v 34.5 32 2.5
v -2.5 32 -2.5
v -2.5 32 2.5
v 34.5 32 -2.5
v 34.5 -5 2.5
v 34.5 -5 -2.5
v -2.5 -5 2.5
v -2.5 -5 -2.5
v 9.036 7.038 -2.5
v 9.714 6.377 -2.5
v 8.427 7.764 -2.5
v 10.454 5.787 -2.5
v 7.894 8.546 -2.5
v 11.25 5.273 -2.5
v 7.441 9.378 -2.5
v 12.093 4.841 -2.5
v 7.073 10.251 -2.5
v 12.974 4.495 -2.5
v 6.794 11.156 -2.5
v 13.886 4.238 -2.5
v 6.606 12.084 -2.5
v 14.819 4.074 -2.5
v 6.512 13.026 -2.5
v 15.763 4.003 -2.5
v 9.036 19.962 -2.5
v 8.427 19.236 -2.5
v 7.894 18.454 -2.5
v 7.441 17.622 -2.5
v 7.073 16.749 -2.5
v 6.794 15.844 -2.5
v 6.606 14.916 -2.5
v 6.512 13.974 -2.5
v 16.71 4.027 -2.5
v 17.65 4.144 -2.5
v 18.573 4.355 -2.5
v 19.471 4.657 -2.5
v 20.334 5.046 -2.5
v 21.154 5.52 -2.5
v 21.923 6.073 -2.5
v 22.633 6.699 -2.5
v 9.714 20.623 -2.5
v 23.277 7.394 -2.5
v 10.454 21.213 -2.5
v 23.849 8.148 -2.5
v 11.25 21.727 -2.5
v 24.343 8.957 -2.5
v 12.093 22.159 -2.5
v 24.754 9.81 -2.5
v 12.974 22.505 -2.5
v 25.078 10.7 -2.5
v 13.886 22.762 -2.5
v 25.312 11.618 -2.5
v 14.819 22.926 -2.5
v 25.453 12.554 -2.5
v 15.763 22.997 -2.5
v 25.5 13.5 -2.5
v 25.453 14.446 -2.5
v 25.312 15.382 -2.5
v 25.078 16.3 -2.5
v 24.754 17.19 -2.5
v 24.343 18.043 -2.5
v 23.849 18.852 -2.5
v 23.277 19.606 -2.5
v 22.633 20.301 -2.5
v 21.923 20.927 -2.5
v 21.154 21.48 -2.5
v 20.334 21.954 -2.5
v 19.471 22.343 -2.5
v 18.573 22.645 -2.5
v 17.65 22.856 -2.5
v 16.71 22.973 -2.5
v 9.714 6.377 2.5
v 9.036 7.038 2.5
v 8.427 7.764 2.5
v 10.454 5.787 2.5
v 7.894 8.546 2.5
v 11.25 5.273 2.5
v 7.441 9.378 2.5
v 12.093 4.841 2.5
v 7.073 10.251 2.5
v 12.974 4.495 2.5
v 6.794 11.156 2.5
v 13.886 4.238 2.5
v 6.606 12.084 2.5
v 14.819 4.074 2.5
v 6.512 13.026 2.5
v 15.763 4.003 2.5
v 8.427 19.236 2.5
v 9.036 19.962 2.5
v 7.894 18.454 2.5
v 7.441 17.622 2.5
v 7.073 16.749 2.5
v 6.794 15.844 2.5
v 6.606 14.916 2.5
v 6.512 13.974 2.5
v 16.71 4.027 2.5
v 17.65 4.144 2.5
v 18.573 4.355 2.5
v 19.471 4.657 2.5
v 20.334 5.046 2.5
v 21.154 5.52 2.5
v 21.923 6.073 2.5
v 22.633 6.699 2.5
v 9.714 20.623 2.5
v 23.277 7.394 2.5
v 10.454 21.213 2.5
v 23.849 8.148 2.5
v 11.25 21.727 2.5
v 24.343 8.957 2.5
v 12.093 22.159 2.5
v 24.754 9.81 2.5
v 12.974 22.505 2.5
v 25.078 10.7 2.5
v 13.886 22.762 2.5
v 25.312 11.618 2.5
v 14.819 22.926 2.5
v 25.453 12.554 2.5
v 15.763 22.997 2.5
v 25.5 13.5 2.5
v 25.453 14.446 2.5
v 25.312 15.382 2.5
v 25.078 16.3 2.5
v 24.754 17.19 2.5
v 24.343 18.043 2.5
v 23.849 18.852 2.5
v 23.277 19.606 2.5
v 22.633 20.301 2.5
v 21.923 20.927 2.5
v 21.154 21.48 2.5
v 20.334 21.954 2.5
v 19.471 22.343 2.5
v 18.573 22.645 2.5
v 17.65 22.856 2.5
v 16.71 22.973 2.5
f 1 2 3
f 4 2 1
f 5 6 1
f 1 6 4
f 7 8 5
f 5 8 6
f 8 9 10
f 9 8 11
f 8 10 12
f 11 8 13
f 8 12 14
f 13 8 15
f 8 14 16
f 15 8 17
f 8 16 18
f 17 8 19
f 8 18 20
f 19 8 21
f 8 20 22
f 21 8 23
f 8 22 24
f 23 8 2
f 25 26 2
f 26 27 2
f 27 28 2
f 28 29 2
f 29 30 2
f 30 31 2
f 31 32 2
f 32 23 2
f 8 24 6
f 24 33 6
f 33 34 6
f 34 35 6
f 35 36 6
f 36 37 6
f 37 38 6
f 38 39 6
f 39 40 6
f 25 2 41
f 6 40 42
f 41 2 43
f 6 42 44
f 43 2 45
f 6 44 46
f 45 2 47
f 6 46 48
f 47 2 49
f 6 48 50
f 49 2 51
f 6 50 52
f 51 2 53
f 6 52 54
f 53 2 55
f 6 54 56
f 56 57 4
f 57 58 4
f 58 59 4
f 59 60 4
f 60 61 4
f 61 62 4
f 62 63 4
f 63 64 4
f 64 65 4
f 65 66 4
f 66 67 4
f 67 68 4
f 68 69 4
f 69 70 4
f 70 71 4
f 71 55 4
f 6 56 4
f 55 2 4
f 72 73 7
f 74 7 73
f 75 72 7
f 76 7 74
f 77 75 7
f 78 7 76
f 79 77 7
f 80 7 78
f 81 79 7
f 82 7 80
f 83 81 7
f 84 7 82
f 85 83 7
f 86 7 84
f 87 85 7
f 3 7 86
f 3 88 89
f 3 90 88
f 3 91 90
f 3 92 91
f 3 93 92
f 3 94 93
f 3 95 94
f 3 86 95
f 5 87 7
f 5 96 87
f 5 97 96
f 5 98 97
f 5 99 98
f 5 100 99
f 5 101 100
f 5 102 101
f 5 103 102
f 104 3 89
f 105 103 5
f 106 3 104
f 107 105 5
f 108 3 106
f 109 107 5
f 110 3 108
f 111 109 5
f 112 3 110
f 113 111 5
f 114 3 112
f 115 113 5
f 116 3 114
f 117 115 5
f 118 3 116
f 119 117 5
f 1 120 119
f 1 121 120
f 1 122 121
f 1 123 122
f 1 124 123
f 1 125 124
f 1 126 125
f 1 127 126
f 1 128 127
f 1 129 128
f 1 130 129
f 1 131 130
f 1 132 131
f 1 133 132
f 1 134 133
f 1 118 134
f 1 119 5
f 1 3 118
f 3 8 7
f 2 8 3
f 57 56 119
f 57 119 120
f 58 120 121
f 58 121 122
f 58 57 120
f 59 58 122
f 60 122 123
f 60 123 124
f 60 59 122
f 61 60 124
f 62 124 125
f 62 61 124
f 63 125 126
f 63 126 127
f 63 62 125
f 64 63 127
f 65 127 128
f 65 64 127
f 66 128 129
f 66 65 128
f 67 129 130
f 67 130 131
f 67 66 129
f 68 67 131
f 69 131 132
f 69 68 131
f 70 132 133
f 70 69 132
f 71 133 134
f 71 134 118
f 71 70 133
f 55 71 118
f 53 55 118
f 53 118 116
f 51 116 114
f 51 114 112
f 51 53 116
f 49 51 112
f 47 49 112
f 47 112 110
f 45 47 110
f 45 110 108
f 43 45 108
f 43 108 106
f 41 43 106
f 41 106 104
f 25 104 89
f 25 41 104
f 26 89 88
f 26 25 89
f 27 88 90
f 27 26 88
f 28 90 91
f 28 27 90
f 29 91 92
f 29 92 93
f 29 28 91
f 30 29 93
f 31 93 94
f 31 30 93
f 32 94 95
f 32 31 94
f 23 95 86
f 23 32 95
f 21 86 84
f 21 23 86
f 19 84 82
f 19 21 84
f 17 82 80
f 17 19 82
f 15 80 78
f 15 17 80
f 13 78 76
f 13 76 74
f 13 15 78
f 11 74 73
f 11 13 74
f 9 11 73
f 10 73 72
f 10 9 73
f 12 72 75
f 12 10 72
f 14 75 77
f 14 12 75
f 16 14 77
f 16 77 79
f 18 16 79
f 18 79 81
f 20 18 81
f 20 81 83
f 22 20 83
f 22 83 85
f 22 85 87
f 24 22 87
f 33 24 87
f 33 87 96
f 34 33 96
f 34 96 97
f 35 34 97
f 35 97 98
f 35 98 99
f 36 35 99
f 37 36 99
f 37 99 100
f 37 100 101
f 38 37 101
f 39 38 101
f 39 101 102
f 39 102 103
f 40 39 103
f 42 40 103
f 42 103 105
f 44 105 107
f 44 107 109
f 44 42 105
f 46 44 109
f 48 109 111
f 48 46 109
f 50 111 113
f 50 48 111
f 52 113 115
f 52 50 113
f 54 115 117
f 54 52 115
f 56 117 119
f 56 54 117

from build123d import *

# Parameters (mm, degrees)
F0_W     = 37
F0_H     = 37
F0_R     = 9.5
F1_DEPTH = 5
F2_ANGLE = 90


with BuildPart() as f1:
    # F0 (on Front) → F1 (new body)
    with BuildSketch(Plane.XZ):
        Rectangle(F0_W, F0_H)
        Circle(F0_R, mode=Mode.SUBTRACT)
    extrude(amount=F1_DEPTH)


with BuildPart() as f1_1:
    # F2: moved
    add(f1.part.rotate(Axis((0, 0, 18.5), (-1, 0, 0)), F2_ANGLE))


with BuildPart() as f1_2:
    # F3: moved
    add(f1_1.part.moved(Location((16, 32, -21))))


solid = f1_2.part
